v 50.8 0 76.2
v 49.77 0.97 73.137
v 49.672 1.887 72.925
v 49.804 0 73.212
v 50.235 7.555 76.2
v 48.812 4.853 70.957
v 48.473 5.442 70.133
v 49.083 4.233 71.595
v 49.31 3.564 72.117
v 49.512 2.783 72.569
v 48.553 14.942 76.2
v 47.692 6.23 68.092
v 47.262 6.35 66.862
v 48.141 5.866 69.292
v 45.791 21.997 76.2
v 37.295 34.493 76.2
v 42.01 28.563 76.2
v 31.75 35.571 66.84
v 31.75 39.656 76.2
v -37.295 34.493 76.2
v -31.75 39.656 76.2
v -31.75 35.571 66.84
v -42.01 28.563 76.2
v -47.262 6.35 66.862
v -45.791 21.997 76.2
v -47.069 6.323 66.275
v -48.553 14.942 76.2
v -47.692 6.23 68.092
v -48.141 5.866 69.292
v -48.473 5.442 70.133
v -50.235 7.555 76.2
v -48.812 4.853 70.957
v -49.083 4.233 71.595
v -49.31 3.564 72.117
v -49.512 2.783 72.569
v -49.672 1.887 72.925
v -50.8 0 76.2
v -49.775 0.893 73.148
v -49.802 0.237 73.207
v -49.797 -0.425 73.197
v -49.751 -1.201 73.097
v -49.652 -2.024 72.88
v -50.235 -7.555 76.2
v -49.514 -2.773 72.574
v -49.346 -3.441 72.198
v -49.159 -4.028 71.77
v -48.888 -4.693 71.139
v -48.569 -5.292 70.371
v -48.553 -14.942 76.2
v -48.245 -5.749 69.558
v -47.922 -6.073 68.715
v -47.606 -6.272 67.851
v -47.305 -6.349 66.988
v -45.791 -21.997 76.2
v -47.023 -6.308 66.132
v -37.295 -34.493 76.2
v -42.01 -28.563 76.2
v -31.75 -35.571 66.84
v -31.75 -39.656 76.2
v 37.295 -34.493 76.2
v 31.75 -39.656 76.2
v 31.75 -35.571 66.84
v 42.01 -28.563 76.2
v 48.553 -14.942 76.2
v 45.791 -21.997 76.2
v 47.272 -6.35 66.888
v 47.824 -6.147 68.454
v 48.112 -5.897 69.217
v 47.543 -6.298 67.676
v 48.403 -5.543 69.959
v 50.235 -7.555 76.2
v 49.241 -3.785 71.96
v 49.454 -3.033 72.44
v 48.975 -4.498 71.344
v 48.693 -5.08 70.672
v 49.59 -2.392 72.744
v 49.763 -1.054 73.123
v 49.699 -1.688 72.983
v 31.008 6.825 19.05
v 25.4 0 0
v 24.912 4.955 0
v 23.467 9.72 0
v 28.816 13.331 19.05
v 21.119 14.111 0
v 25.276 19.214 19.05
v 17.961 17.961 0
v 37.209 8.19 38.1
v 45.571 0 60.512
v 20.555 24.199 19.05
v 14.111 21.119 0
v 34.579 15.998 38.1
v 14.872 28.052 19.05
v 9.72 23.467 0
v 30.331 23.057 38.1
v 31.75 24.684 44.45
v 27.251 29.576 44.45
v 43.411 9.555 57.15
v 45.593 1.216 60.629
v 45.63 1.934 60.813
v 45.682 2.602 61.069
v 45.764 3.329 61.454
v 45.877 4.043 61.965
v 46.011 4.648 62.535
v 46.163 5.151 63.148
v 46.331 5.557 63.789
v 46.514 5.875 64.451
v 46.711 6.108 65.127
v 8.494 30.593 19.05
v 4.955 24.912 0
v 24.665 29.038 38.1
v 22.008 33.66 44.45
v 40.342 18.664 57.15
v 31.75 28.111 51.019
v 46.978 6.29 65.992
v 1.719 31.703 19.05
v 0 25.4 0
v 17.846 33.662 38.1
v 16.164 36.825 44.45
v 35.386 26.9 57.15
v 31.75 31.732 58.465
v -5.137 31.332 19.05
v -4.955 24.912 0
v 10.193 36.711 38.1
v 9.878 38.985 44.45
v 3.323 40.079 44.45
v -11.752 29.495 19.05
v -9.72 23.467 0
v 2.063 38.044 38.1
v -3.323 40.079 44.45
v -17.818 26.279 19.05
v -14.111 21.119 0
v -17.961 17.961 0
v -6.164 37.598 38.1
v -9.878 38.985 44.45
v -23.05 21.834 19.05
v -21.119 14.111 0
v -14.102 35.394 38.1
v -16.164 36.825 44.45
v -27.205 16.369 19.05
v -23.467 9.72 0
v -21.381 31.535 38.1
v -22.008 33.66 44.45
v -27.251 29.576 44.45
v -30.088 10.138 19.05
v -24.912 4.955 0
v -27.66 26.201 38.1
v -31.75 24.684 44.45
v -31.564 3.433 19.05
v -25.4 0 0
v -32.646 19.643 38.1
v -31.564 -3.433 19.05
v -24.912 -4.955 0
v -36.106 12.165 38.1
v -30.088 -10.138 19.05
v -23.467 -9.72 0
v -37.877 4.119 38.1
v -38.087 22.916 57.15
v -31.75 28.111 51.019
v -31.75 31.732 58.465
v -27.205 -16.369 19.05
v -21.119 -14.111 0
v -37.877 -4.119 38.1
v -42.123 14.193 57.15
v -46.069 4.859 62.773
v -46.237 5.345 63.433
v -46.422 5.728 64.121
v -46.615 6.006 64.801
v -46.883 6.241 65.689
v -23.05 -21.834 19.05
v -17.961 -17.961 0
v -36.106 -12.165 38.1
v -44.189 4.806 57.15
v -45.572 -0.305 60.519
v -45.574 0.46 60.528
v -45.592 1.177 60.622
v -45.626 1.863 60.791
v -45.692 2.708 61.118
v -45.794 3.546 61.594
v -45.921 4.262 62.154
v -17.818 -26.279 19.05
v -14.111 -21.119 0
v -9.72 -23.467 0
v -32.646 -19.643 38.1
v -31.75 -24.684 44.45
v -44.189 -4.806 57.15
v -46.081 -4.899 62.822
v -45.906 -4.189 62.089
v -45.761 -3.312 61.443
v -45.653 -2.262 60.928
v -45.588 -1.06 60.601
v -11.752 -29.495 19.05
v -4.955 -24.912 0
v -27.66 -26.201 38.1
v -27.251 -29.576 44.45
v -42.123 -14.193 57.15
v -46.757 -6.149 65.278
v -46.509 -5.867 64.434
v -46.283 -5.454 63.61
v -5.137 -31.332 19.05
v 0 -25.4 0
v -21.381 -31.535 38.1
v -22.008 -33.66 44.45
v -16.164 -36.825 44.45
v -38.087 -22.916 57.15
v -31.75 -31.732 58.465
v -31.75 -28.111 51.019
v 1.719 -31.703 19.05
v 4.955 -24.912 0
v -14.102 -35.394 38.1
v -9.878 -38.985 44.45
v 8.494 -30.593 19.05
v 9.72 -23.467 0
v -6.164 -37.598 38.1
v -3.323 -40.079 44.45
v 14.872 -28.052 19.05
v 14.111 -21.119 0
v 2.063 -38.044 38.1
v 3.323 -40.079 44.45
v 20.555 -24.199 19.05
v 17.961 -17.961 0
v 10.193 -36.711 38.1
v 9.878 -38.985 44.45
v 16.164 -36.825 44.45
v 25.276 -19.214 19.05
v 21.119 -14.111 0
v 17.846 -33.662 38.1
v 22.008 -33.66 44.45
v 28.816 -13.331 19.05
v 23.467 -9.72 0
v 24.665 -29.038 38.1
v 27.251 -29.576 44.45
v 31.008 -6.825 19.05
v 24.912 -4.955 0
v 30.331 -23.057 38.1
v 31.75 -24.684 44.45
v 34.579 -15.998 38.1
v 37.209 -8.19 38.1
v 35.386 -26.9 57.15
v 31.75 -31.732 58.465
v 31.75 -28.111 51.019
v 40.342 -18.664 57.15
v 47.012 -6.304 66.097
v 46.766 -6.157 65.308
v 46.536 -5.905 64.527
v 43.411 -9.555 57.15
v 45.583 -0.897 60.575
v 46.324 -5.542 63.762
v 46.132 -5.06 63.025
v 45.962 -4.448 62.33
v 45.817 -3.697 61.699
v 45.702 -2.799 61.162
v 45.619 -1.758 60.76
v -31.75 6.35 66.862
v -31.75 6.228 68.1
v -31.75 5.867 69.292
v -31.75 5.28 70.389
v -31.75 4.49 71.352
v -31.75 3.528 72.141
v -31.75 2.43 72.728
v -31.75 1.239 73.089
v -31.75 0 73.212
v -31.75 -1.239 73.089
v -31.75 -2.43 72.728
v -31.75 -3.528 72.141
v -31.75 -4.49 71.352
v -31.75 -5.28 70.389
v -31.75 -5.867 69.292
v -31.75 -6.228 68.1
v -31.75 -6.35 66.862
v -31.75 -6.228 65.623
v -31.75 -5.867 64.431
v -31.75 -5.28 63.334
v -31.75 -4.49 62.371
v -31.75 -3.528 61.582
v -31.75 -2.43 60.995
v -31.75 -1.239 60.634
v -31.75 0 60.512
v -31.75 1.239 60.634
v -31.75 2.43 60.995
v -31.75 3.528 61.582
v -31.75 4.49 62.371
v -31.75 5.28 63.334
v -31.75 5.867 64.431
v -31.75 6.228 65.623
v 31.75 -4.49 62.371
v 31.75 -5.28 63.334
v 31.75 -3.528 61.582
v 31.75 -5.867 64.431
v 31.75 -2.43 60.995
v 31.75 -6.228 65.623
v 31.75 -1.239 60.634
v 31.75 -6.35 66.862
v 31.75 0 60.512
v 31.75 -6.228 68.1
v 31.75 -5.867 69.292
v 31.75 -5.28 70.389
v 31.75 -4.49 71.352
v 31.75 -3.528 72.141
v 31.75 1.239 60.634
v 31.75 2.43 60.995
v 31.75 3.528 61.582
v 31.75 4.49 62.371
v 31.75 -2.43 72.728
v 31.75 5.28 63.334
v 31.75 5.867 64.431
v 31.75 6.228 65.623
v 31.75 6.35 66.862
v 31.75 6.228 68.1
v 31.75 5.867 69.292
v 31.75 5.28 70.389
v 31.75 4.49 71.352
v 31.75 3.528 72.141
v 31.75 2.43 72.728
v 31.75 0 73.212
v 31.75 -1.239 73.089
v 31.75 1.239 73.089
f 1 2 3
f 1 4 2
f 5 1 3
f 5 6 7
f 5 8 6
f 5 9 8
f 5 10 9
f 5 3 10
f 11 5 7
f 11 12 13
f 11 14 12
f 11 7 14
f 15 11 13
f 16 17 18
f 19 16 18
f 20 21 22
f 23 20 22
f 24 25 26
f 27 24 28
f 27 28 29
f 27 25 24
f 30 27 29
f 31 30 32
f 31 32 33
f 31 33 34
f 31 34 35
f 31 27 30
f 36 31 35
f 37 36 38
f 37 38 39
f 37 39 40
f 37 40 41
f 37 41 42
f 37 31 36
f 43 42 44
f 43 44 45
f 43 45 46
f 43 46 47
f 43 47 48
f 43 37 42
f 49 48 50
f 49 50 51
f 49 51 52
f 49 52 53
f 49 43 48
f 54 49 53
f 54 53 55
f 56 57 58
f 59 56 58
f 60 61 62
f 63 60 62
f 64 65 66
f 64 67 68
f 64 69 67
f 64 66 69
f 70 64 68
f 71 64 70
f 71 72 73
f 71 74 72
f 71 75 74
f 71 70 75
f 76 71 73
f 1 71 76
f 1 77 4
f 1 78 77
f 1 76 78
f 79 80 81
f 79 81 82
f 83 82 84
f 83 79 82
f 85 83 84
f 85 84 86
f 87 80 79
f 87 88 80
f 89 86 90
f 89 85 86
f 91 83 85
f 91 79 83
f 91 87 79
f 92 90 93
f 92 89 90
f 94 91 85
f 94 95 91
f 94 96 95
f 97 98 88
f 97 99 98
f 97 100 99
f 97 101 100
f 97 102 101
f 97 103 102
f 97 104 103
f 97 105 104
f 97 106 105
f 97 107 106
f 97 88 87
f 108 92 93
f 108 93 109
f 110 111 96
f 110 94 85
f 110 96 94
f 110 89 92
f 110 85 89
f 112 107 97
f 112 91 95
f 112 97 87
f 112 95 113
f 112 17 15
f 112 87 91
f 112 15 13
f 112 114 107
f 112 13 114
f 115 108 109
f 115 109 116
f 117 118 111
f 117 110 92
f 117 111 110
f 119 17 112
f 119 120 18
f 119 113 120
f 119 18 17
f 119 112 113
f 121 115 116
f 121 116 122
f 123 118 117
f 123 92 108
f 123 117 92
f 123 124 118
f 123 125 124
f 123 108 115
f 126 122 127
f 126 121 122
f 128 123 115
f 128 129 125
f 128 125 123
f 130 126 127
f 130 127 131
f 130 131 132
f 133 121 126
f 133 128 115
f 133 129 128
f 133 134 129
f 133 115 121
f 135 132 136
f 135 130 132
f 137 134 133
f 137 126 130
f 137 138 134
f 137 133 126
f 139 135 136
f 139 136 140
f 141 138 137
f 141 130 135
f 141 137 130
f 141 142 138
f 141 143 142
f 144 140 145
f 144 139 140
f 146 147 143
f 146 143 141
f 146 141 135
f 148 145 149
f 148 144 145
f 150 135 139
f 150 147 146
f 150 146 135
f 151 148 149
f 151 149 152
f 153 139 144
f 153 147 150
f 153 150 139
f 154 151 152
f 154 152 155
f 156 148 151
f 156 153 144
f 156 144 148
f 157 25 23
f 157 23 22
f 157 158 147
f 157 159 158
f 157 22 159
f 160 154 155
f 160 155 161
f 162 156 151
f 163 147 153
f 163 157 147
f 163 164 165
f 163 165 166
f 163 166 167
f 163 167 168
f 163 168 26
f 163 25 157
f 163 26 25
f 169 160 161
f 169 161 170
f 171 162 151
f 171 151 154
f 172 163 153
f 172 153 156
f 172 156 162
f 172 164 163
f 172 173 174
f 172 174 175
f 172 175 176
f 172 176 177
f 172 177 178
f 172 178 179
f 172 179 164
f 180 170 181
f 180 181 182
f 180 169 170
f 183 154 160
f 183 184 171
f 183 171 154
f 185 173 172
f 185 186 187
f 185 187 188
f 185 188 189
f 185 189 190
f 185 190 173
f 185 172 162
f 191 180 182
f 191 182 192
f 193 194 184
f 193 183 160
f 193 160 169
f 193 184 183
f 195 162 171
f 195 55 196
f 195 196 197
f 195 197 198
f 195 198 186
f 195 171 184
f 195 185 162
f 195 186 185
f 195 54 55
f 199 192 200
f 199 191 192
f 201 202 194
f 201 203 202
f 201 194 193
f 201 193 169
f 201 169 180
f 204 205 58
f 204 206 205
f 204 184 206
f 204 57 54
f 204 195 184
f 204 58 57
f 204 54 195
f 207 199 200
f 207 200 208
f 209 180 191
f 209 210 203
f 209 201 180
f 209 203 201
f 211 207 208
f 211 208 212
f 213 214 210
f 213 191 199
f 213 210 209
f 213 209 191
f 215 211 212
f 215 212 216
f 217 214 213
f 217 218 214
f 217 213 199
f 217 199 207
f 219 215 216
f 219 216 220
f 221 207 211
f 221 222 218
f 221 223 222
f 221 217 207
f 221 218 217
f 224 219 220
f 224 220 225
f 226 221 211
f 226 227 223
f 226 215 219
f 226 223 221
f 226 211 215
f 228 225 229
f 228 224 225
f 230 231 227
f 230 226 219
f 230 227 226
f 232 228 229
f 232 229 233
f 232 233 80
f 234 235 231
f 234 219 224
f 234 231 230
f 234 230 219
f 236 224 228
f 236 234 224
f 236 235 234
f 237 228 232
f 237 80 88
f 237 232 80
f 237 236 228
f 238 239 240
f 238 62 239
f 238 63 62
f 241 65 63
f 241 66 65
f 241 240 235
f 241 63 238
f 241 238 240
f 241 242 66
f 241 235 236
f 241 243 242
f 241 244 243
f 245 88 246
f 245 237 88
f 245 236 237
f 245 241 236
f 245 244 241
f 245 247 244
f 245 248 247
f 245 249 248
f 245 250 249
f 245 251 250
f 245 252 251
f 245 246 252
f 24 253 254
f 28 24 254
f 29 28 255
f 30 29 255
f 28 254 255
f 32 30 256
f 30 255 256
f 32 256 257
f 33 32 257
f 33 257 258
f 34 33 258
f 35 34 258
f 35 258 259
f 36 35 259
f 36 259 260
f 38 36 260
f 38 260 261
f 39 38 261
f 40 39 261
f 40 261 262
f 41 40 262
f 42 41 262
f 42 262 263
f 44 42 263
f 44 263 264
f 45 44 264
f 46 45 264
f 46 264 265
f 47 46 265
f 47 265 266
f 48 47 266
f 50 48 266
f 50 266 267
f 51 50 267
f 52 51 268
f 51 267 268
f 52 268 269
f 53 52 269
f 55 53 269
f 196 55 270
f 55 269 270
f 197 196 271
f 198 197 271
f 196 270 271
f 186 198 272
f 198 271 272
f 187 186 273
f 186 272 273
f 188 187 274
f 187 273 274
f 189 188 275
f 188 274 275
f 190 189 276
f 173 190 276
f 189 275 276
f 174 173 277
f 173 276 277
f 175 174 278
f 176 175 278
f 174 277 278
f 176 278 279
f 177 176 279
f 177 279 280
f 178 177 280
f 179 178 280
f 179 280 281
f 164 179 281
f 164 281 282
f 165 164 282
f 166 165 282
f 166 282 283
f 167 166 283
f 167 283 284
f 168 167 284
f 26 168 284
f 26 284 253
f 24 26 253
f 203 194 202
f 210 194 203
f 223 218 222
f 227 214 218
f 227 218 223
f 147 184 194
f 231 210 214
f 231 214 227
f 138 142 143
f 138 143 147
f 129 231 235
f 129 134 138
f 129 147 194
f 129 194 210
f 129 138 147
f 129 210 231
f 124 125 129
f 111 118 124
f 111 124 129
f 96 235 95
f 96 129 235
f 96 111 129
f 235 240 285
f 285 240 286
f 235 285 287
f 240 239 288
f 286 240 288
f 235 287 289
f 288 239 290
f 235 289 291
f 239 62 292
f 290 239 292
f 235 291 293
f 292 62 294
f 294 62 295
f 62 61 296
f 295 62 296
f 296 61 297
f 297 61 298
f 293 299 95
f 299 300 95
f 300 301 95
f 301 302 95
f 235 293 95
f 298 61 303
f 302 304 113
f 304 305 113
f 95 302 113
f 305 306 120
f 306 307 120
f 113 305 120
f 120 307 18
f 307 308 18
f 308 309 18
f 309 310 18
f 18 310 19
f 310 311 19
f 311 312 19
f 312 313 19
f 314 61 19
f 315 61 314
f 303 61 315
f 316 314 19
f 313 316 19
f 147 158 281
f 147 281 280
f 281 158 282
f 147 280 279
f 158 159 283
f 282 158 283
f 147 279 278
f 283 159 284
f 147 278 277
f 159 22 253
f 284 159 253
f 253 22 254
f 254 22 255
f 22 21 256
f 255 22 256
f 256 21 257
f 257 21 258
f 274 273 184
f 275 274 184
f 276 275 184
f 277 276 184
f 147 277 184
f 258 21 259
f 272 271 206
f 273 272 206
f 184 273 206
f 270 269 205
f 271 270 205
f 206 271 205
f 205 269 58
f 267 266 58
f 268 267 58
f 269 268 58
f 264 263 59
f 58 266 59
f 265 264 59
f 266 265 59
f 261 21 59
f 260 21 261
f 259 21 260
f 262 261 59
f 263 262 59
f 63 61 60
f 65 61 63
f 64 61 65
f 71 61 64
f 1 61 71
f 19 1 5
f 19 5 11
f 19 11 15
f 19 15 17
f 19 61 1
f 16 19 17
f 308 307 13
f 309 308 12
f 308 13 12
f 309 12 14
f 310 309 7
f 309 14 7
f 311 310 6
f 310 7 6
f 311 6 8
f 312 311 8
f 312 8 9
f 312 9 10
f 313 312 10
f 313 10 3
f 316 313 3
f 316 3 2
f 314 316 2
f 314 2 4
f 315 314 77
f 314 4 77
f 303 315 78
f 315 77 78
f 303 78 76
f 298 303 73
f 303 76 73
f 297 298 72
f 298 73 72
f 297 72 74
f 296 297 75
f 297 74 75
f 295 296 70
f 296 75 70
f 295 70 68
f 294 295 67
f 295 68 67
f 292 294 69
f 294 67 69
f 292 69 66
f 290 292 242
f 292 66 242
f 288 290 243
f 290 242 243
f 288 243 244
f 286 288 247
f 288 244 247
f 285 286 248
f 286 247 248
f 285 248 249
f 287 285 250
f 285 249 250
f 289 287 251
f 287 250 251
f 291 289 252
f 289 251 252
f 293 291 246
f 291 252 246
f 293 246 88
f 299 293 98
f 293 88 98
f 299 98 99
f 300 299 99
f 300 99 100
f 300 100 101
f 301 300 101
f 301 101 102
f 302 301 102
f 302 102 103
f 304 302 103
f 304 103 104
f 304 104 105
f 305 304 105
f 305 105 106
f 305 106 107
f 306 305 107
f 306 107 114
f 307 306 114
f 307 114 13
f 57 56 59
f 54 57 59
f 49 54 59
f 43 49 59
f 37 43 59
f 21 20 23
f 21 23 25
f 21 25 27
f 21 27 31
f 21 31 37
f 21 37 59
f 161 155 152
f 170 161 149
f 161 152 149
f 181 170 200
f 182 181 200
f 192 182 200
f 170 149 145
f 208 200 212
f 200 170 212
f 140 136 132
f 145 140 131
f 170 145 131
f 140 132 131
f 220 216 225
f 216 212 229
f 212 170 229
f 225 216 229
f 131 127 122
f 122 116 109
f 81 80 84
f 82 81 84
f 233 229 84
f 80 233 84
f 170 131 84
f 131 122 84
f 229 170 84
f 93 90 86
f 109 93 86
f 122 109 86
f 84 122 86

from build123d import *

# Parameters (mm, degrees)
F0_R     = 25.4
F2_R     = 50.8
F5_DEPTH = 31.75
F7_R     = 6.35
F8_DEPTH = 127


# Not quite as in the source:
# - a feature names something its author has since deleted; it is built from what else it names


with BuildPart() as f3:
    # F0 (on Top) → F3 section 0
    with BuildSketch(Plane.XY):
        Circle(F0_R)
    # F2 (on offset) → F3 section 1
    with BuildSketch(Plane.XY.offset(76.2)):
        Circle(F2_R)
    loft()

    # F4 (on face) → F5 (cut)
    with BuildSketch(Plane.XY.offset(76.2)):
        with BuildLine():
            Line((31.75, -39.6557372898), (31.75, 39.6557372898))
            ThreePointArc((31.75, 39.6557372898), (0, 50.8), (-31.75, 39.6557372898))
            Line((-31.75, 39.6557372898), (-31.75, -39.6557372898))
            ThreePointArc((-31.75, -39.6557372898), (0, -50.8), (31.75, -39.6557372898))
        make_face()
    extrude(amount=-F5_DEPTH, mode=Mode.SUBTRACT)

    # F7 (on offset) → F8 (cut)
    with BuildSketch(Plane.YZ.offset(50.8)):
        with Locations((0, 66.8615028262)):
            Circle(F7_R)
    extrude(amount=-F8_DEPTH, mode=Mode.SUBTRACT)


solid = f3.part
